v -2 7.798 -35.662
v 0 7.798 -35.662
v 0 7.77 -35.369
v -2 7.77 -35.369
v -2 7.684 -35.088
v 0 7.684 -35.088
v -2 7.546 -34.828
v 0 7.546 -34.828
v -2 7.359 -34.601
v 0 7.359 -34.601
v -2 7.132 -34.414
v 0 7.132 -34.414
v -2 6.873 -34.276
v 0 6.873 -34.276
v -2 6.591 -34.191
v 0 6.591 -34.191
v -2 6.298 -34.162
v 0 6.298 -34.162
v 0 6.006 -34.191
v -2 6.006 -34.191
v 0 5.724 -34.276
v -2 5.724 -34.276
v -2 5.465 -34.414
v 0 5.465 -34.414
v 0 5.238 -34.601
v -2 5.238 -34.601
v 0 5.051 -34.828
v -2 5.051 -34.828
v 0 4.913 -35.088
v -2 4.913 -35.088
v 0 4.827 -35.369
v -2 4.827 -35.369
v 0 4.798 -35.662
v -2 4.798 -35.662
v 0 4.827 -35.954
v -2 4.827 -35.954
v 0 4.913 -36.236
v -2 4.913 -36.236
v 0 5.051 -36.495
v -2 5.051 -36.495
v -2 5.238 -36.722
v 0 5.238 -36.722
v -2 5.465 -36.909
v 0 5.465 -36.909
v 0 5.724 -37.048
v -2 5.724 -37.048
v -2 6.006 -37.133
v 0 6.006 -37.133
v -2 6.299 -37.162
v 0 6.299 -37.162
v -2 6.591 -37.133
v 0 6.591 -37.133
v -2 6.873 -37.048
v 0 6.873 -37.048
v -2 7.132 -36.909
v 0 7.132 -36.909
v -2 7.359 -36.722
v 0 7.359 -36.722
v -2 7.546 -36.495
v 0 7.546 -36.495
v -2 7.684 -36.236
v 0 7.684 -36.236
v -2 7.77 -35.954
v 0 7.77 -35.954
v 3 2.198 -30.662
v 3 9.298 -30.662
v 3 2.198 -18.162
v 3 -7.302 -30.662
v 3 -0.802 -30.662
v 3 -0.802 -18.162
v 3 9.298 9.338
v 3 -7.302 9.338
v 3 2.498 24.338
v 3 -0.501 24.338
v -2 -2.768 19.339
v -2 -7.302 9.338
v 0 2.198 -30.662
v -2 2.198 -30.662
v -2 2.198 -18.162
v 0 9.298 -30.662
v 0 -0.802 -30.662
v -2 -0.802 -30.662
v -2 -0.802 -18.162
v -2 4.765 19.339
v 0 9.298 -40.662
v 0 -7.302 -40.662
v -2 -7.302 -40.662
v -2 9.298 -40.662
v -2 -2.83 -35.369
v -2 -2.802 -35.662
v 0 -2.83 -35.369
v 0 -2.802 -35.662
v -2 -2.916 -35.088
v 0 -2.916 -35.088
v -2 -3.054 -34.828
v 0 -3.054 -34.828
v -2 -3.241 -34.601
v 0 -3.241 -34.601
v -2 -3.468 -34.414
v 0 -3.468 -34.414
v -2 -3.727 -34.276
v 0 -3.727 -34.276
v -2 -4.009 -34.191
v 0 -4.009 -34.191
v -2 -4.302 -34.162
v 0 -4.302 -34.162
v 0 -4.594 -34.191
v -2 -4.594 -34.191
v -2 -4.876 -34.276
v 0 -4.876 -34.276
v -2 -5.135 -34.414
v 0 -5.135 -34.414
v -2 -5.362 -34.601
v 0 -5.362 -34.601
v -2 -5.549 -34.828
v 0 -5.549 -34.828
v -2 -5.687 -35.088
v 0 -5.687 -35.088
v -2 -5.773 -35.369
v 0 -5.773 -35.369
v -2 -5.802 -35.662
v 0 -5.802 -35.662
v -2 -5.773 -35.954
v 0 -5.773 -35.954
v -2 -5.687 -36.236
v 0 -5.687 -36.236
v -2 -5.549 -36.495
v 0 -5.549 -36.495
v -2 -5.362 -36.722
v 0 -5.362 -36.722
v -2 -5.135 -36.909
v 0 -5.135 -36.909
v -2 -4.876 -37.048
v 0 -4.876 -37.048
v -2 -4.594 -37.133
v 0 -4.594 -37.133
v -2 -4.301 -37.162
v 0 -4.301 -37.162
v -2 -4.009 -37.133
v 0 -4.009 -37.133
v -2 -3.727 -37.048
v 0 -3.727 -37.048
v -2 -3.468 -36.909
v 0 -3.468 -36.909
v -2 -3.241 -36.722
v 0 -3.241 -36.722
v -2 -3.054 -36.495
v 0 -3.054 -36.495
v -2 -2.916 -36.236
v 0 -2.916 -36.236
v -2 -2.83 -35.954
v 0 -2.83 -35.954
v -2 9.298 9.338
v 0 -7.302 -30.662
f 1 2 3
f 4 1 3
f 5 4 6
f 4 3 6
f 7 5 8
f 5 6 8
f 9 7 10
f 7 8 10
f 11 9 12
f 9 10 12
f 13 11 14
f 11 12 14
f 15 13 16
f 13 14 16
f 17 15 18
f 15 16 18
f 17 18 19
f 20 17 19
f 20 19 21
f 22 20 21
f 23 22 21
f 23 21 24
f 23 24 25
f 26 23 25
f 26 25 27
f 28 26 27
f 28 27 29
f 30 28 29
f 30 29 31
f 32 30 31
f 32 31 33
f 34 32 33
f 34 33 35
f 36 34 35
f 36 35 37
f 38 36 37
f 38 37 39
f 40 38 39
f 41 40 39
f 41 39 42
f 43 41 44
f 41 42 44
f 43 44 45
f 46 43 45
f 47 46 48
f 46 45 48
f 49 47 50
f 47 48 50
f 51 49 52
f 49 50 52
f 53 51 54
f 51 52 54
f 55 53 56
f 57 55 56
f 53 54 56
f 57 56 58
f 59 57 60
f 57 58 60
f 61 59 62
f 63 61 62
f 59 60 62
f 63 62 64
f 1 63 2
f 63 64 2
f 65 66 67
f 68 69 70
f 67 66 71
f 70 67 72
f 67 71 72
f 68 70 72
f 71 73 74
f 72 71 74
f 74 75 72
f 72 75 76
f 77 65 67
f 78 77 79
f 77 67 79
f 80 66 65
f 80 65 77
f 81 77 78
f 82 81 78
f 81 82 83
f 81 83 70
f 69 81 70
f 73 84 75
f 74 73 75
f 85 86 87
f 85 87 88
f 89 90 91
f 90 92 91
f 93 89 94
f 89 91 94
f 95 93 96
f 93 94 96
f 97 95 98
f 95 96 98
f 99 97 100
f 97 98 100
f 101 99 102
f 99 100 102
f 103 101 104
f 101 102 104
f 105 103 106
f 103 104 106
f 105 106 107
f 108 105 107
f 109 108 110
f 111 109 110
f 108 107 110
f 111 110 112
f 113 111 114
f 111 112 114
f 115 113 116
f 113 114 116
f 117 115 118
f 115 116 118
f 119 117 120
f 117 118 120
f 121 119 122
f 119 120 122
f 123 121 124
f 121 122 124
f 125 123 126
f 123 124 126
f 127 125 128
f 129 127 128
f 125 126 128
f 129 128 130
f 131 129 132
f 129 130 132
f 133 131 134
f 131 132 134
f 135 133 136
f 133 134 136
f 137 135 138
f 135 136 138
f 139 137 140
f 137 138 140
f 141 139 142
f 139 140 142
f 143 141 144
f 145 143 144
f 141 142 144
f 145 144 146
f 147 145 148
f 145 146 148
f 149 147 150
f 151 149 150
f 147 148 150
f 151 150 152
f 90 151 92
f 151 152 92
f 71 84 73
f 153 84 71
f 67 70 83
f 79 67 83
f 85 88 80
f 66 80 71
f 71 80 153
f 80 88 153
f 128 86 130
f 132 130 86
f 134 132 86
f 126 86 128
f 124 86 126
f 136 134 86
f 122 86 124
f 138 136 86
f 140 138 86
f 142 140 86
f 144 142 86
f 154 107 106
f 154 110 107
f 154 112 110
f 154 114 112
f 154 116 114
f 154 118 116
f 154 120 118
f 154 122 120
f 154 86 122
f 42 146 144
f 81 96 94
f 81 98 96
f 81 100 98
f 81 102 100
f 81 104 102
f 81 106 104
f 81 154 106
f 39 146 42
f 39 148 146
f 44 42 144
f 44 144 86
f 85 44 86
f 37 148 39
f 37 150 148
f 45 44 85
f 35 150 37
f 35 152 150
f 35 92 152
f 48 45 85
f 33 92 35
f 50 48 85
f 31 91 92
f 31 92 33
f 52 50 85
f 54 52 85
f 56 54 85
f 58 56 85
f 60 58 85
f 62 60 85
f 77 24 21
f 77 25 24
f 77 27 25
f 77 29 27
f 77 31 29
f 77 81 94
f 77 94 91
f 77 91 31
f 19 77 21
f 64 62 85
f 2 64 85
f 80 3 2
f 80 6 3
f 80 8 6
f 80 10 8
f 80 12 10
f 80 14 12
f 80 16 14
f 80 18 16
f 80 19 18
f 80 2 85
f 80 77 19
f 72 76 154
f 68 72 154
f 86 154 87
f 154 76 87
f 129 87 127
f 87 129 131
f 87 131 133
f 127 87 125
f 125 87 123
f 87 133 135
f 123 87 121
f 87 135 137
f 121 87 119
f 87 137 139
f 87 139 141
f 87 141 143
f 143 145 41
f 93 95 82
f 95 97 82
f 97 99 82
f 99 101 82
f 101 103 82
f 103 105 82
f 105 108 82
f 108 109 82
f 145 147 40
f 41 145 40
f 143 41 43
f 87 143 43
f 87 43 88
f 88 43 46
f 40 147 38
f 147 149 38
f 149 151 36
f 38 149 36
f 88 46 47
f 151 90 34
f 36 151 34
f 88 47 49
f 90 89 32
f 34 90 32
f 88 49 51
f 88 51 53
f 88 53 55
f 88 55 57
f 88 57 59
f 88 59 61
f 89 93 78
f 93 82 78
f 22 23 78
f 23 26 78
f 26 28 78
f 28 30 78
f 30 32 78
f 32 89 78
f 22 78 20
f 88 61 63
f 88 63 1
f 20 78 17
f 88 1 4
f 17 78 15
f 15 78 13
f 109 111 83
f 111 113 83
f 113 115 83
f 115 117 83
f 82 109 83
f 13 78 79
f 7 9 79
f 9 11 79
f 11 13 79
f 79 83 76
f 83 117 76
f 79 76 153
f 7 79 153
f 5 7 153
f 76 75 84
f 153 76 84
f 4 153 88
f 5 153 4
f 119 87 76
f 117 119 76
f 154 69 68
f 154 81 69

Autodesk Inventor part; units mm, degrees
ref_plane "YZ Plane" through (0, 0, 0) normal (1, 0, 0) x (0, 1, 0)
ref_plane "XZ Plane" through (0, 0, 0) normal (0, 1, 0) x (-1, 0, 0)
ref_plane "XY Plane" through (0, 0, 0) normal (0, 0, 1) x (1, 0, 0)
sketch "スケッチ1" plane through (0, 0, 0) normal (1, 0, 0) x (0, 1, 0)
  line L0 (9.2985, 24.3383) -> (-7.3015, 24.3383)
  line L1 (-7.3015, 24.3383) -> (-7.3015, -40.6617)
  line L2 (-7.3015, -40.6617) -> (9.2985, -40.6617)
  line L3 (9.2985, -40.6617) -> (9.2985, 24.3383)
  line L4 (-7.3015, -40.6617) -> (9.2985, -40.6617)
  line L5 (9.2985, -40.6617) -> (9.2985, -30.6617)
  line L6 (9.2985, -30.6617) -> (-7.3015, -30.6617)
  line L7 (-7.3015, -30.6617) -> (-7.3015, -40.6617)
  circle A0 centre (6.2985, -35.6617) radius 1.5
  circle A1 centre (-4.3015, -35.6617) radius 1.5
  line L8 (2.4985, 24.3383) -> (9.2985, 9.3383)
  line L9 (-0.5015, 24.3383) -> (-7.3015, 9.3383)
  point P0 (0, 0)
  dimension "d0" = 16.6
  dimension "d1" = 10
  dimension "d2" = 3
  dimension "d3" = 3
  dimension "d4" = 5
  dimension "d5" = 5
  dimension "d6" = 3
  dimension "d7" = 3
  dimension "d8" = 3
  dimension "d9" = 15
  dimension "d10" = 15
  dimension "d11" = 6.8
  dimension "d12" = 6.8
  dimension "d13" = 40
extrude "押し出し1" add sketch "スケッチ1" against normal blind 2 contours L8 L3 L6 L1 L9 L0 | L3 L2 L1 L6
extrude "押し出し2" add sketch "スケッチ1" along normal blind 3 contours L8 L3 L6 L1 L9 L0
sketch "スケッチ2" plane through (-2, 9.2985, -40.6617) normal (0, 1, 0) x (1, 0, 0)
  line L0 (5, -50) -> (5, -10) projected
  line L1 (0, 0) -> (0, -50) projected
  line L2 (5, -10) -> (0, -10)
  line L3 (0, -10) -> (0, -10.7373)
  line L4 (0, -10.7373) -> (5, -10.7373)
  line L5 (5, -10.7373) -> (5, -10)
  line L6 (5, -22.5) -> (0, -22.5)
  line L7 (0, -22.5) -> (0, -27.5)
  line L8 (0, -27.5) -> (5, -27.5)
  line L9 (5, -27.5) -> (5, -22.5)
  point P0 (2, -40.6617)
  dimension "d18" = 12.5
  dimension "d19" = 5
extrude "押し出し3" add sketch "スケッチ2" along normal blind 3 contours L8 L1 L6 L0
chamfer "面取り1" distance 5 angle 45 1 edges at (-2, 0.9985, 24.3383)
sketch "スケッチ3" plane through (-2, 9.2985, -40.6617) normal (0, 1, 0) x (1, 0, 0)
  line L0 (5, -50) -> (5, -10) projected
  line L1 (0, -22.5) -> (5, -22.5)
  line L2 (5, -22.5) -> (5, -10)
  line L3 (5, -10) -> (0, -10)
  line L4 (0, -10) -> (0, -22.5)
  point P0 (2, -40.6617)
extrude "押し出し4" cut sketch "スケッチ3" against normal blind 10.1
sketch "スケッチ4" plane through (3, 12.2985, -18.1617) normal (0, 0, -1) x (-1, 0, 0)
  line L0 (0, 0) -> (5, 0) projected
  line L1 (5, 0) -> (0, 0)
  line L2 (0, 0) -> (0, -10.1)
  line L3 (0, -10.1) -> (5, -10.1)
  line L4 (5, -10.1) -> (5, 0)
  line L5 (0, -13.1) -> (5, -13.1) projected
  point P0 (3, -12.2985)
  dimension "d27" = 3
extrude "押し出し5" add sketch "スケッチ4" along normal blind 12.5
sketch "スケッチ5" plane through (-2, 12.2985, -40.6617) normal (0, 1, 0) x (1, 0, 0)
  line L0 (5, -10) -> (5, -22.5) projected
  line L1 (0, -27.5) -> (0, -10) projected
  line L2 (5, -10) -> (0, -10)
  line L3 (0, -10) -> (0, -27.5)
  line L4 (0, -27.5) -> (5, -27.5)
  line L5 (5, -27.5) -> (5, -10)
  point P0 (2, -40.6617)
extrude "押し出し6" cut sketch "スケッチ5" against normal blind 3
properties part number "armmodulepart1"
